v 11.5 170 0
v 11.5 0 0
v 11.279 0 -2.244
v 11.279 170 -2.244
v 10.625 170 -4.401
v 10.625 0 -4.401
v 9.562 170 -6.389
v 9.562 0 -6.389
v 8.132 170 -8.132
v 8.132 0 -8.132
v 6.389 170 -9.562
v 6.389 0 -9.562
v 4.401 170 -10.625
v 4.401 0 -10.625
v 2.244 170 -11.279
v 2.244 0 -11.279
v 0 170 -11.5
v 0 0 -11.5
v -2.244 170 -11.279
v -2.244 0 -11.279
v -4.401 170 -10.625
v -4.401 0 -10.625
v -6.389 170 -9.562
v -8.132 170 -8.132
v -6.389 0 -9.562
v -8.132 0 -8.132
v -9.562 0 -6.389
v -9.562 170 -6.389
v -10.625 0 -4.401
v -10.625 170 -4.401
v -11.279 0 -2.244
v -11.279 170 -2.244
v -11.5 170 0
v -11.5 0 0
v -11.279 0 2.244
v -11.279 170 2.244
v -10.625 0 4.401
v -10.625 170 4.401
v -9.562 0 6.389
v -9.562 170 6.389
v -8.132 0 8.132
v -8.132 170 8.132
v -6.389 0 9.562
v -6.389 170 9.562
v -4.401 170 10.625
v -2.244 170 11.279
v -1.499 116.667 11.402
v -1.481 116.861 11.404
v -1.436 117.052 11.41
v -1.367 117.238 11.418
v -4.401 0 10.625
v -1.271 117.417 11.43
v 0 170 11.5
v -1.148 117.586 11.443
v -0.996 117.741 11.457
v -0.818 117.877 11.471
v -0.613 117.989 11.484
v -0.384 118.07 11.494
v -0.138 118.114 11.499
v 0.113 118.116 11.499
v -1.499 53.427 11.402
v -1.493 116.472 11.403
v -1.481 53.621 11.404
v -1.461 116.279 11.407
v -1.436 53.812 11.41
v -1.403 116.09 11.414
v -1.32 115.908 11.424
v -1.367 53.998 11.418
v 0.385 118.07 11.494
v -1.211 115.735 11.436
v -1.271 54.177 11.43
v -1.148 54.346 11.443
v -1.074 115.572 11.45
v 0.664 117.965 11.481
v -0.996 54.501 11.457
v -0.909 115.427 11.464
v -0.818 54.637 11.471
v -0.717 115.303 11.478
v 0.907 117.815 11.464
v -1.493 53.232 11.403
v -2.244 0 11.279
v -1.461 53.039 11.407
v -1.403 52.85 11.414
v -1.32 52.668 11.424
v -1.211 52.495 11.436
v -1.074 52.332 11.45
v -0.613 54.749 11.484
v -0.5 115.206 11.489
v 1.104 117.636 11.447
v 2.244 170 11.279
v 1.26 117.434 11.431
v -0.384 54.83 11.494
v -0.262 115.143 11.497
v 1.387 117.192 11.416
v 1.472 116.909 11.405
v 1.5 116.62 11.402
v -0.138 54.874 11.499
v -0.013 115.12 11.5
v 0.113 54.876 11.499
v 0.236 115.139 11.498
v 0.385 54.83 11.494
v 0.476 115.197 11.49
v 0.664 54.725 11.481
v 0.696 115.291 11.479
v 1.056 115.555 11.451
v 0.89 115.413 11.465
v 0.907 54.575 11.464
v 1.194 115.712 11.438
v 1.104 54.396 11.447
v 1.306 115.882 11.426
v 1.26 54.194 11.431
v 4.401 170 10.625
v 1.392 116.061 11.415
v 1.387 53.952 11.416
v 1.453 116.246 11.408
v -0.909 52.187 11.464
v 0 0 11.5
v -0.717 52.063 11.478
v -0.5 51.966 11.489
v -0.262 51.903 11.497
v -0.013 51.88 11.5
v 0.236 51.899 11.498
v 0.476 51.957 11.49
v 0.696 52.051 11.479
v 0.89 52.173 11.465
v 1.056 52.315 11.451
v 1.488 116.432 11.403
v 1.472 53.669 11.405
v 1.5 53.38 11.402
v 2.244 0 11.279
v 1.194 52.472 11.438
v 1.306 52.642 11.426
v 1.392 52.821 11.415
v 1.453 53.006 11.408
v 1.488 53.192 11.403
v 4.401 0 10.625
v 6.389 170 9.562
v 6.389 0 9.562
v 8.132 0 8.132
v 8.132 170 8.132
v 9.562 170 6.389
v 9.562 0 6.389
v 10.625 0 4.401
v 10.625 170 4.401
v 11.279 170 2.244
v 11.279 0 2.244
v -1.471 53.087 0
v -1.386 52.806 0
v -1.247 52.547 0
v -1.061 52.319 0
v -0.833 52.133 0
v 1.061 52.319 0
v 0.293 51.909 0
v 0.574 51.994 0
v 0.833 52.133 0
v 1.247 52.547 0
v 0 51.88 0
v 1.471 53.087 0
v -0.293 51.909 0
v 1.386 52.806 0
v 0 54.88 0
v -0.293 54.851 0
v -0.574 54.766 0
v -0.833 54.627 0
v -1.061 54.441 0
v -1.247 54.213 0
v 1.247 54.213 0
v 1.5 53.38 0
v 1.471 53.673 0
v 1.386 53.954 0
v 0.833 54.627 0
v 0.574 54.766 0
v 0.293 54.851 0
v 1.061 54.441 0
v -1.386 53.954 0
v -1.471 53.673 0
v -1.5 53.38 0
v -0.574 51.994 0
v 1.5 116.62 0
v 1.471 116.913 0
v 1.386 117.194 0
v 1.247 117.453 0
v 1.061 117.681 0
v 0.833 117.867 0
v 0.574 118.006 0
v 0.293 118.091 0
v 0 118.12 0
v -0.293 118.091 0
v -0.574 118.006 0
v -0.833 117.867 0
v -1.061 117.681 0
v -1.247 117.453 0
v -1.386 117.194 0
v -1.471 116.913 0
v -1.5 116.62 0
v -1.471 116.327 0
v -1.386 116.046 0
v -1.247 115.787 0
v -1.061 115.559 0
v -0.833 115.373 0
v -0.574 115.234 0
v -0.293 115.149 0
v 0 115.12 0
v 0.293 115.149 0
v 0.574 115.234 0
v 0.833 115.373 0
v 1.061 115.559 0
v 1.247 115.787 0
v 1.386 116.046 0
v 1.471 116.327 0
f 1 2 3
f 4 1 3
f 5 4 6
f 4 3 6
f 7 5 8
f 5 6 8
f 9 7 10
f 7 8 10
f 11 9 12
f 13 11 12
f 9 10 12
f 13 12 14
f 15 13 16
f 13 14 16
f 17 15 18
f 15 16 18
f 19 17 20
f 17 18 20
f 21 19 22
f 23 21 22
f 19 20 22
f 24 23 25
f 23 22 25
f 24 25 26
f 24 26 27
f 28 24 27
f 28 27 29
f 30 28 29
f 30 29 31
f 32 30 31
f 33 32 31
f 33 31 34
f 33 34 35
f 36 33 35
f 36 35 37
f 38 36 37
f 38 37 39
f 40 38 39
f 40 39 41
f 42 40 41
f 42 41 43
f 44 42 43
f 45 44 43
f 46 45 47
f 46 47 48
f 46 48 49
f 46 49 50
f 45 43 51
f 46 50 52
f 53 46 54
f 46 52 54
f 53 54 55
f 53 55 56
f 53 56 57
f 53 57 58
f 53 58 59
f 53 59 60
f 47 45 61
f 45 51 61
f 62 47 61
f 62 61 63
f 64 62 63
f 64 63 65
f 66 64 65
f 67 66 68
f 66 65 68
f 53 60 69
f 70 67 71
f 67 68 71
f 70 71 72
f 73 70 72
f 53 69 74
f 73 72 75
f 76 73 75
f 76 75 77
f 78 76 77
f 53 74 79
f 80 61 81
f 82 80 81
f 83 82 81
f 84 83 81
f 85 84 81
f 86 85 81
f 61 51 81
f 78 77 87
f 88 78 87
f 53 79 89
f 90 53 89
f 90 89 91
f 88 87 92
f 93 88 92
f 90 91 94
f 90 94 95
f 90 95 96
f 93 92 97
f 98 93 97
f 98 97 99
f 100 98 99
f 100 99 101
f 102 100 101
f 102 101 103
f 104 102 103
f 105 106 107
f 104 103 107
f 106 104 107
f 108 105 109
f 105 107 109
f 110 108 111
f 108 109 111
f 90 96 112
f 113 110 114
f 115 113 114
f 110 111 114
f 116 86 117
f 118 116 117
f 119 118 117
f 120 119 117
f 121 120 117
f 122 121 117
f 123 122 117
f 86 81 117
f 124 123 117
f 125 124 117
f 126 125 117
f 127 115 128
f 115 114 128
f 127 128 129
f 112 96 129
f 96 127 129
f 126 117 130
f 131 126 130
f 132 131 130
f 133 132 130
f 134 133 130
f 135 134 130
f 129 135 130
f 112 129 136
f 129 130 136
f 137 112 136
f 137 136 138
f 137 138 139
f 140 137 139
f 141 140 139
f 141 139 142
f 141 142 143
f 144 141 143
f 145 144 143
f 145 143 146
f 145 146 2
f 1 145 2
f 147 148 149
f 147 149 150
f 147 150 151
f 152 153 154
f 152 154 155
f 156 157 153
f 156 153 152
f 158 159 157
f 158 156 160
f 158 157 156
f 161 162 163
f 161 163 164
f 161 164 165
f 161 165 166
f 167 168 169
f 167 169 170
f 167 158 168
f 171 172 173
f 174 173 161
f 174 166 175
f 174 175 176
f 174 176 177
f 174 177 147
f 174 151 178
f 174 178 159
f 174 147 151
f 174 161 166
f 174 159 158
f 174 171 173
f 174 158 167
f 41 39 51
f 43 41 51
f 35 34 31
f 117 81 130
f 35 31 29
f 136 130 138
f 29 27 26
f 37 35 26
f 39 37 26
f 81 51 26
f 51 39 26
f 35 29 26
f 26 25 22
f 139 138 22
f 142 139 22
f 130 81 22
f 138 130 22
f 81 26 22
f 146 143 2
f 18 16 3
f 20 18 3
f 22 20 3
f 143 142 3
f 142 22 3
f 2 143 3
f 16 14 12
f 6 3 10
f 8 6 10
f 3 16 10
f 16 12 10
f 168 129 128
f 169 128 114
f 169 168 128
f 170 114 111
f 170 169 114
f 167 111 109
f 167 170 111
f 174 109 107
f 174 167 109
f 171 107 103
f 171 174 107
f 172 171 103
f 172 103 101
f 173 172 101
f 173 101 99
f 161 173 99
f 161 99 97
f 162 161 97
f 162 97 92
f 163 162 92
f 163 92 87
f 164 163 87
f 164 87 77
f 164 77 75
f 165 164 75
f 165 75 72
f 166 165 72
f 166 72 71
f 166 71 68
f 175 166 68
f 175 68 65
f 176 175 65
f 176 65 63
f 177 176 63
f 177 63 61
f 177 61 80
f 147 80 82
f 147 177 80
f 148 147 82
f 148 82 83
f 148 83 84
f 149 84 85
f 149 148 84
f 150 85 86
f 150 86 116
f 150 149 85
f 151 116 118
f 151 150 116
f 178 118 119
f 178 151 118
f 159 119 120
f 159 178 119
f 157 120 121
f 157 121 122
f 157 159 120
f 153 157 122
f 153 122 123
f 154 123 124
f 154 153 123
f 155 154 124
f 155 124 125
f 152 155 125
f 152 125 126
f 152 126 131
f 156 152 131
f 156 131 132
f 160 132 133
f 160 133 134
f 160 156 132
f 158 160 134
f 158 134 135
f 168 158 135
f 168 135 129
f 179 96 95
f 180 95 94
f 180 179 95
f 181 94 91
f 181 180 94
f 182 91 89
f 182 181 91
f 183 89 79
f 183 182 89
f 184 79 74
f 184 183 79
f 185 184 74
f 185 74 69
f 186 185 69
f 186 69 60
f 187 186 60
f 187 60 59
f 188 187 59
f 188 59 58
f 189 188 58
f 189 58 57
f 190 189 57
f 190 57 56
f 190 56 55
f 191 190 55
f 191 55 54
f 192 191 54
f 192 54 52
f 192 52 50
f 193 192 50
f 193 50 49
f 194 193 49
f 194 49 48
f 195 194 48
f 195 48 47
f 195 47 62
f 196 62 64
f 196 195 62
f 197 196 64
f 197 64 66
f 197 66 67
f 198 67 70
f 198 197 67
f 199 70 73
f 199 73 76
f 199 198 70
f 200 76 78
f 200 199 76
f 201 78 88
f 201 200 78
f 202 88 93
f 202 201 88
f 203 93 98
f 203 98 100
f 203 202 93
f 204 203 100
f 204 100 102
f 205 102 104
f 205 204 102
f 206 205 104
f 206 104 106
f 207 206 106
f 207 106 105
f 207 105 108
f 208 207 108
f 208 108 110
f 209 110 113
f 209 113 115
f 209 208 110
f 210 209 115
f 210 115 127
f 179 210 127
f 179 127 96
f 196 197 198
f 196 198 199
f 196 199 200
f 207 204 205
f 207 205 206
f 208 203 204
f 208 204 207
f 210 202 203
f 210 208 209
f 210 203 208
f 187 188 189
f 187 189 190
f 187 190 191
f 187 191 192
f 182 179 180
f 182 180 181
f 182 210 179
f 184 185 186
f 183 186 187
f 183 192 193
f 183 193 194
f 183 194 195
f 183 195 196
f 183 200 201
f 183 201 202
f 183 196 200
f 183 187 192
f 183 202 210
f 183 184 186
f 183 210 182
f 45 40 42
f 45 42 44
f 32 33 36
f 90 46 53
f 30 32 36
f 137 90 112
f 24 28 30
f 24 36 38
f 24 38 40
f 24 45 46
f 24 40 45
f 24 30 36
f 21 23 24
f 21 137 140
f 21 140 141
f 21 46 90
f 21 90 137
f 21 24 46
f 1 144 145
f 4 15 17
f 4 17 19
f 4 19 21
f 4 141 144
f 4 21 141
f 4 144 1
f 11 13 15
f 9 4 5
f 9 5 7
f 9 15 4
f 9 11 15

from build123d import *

# Parameters (mm, degrees)
SKETCH2_R           = 11.5
BOSS_EXTRUDE1_DEPTH = 170
CUT_EXTRUDE1_REACH  = 13.5
SKETCH3_R           = 1.5


with BuildPart() as part:
    # Sketch2 → Boss-Extrude1 (new body)
    with BuildSketch(Plane(origin=(0, 0, 0), x_dir=(1, 0, 0), z_dir=(0, 1, 0))):
        Circle(SKETCH2_R)
    extrude(amount=BOSS_EXTRUDE1_DEPTH)

    # Sketch3 → Cut-Extrude1 (cut, up to next)
    with BuildSketch(Plane.XY, mode=Mode.PRIVATE) as cut_extrude1_sk1:
        with Locations((0, 53.38)):
            Circle(SKETCH3_R)
    cut_extrude1_tool1 = extrude(cut_extrude1_sk1.sketch, amount=CUT_EXTRUDE1_REACH, mode=Mode.PRIVATE) & part.part
    add(cut_extrude1_tool1.solids().sort_by_distance((0, 53.38, 0))[0], mode=Mode.SUBTRACT)
    # Sketch3 → Cut-Extrude1 (cut, up to next)
    with BuildSketch(Plane.XY, mode=Mode.PRIVATE) as cut_extrude1_sk2:
        with Locations((0, 116.62)):
            Circle(SKETCH3_R)
    cut_extrude1_tool2 = extrude(cut_extrude1_sk2.sketch, amount=CUT_EXTRUDE1_REACH, mode=Mode.PRIVATE) & part.part
    add(cut_extrude1_tool2.solids().sort_by_distance((0, 116.62, 0))[0], mode=Mode.SUBTRACT)


solid = part.part
